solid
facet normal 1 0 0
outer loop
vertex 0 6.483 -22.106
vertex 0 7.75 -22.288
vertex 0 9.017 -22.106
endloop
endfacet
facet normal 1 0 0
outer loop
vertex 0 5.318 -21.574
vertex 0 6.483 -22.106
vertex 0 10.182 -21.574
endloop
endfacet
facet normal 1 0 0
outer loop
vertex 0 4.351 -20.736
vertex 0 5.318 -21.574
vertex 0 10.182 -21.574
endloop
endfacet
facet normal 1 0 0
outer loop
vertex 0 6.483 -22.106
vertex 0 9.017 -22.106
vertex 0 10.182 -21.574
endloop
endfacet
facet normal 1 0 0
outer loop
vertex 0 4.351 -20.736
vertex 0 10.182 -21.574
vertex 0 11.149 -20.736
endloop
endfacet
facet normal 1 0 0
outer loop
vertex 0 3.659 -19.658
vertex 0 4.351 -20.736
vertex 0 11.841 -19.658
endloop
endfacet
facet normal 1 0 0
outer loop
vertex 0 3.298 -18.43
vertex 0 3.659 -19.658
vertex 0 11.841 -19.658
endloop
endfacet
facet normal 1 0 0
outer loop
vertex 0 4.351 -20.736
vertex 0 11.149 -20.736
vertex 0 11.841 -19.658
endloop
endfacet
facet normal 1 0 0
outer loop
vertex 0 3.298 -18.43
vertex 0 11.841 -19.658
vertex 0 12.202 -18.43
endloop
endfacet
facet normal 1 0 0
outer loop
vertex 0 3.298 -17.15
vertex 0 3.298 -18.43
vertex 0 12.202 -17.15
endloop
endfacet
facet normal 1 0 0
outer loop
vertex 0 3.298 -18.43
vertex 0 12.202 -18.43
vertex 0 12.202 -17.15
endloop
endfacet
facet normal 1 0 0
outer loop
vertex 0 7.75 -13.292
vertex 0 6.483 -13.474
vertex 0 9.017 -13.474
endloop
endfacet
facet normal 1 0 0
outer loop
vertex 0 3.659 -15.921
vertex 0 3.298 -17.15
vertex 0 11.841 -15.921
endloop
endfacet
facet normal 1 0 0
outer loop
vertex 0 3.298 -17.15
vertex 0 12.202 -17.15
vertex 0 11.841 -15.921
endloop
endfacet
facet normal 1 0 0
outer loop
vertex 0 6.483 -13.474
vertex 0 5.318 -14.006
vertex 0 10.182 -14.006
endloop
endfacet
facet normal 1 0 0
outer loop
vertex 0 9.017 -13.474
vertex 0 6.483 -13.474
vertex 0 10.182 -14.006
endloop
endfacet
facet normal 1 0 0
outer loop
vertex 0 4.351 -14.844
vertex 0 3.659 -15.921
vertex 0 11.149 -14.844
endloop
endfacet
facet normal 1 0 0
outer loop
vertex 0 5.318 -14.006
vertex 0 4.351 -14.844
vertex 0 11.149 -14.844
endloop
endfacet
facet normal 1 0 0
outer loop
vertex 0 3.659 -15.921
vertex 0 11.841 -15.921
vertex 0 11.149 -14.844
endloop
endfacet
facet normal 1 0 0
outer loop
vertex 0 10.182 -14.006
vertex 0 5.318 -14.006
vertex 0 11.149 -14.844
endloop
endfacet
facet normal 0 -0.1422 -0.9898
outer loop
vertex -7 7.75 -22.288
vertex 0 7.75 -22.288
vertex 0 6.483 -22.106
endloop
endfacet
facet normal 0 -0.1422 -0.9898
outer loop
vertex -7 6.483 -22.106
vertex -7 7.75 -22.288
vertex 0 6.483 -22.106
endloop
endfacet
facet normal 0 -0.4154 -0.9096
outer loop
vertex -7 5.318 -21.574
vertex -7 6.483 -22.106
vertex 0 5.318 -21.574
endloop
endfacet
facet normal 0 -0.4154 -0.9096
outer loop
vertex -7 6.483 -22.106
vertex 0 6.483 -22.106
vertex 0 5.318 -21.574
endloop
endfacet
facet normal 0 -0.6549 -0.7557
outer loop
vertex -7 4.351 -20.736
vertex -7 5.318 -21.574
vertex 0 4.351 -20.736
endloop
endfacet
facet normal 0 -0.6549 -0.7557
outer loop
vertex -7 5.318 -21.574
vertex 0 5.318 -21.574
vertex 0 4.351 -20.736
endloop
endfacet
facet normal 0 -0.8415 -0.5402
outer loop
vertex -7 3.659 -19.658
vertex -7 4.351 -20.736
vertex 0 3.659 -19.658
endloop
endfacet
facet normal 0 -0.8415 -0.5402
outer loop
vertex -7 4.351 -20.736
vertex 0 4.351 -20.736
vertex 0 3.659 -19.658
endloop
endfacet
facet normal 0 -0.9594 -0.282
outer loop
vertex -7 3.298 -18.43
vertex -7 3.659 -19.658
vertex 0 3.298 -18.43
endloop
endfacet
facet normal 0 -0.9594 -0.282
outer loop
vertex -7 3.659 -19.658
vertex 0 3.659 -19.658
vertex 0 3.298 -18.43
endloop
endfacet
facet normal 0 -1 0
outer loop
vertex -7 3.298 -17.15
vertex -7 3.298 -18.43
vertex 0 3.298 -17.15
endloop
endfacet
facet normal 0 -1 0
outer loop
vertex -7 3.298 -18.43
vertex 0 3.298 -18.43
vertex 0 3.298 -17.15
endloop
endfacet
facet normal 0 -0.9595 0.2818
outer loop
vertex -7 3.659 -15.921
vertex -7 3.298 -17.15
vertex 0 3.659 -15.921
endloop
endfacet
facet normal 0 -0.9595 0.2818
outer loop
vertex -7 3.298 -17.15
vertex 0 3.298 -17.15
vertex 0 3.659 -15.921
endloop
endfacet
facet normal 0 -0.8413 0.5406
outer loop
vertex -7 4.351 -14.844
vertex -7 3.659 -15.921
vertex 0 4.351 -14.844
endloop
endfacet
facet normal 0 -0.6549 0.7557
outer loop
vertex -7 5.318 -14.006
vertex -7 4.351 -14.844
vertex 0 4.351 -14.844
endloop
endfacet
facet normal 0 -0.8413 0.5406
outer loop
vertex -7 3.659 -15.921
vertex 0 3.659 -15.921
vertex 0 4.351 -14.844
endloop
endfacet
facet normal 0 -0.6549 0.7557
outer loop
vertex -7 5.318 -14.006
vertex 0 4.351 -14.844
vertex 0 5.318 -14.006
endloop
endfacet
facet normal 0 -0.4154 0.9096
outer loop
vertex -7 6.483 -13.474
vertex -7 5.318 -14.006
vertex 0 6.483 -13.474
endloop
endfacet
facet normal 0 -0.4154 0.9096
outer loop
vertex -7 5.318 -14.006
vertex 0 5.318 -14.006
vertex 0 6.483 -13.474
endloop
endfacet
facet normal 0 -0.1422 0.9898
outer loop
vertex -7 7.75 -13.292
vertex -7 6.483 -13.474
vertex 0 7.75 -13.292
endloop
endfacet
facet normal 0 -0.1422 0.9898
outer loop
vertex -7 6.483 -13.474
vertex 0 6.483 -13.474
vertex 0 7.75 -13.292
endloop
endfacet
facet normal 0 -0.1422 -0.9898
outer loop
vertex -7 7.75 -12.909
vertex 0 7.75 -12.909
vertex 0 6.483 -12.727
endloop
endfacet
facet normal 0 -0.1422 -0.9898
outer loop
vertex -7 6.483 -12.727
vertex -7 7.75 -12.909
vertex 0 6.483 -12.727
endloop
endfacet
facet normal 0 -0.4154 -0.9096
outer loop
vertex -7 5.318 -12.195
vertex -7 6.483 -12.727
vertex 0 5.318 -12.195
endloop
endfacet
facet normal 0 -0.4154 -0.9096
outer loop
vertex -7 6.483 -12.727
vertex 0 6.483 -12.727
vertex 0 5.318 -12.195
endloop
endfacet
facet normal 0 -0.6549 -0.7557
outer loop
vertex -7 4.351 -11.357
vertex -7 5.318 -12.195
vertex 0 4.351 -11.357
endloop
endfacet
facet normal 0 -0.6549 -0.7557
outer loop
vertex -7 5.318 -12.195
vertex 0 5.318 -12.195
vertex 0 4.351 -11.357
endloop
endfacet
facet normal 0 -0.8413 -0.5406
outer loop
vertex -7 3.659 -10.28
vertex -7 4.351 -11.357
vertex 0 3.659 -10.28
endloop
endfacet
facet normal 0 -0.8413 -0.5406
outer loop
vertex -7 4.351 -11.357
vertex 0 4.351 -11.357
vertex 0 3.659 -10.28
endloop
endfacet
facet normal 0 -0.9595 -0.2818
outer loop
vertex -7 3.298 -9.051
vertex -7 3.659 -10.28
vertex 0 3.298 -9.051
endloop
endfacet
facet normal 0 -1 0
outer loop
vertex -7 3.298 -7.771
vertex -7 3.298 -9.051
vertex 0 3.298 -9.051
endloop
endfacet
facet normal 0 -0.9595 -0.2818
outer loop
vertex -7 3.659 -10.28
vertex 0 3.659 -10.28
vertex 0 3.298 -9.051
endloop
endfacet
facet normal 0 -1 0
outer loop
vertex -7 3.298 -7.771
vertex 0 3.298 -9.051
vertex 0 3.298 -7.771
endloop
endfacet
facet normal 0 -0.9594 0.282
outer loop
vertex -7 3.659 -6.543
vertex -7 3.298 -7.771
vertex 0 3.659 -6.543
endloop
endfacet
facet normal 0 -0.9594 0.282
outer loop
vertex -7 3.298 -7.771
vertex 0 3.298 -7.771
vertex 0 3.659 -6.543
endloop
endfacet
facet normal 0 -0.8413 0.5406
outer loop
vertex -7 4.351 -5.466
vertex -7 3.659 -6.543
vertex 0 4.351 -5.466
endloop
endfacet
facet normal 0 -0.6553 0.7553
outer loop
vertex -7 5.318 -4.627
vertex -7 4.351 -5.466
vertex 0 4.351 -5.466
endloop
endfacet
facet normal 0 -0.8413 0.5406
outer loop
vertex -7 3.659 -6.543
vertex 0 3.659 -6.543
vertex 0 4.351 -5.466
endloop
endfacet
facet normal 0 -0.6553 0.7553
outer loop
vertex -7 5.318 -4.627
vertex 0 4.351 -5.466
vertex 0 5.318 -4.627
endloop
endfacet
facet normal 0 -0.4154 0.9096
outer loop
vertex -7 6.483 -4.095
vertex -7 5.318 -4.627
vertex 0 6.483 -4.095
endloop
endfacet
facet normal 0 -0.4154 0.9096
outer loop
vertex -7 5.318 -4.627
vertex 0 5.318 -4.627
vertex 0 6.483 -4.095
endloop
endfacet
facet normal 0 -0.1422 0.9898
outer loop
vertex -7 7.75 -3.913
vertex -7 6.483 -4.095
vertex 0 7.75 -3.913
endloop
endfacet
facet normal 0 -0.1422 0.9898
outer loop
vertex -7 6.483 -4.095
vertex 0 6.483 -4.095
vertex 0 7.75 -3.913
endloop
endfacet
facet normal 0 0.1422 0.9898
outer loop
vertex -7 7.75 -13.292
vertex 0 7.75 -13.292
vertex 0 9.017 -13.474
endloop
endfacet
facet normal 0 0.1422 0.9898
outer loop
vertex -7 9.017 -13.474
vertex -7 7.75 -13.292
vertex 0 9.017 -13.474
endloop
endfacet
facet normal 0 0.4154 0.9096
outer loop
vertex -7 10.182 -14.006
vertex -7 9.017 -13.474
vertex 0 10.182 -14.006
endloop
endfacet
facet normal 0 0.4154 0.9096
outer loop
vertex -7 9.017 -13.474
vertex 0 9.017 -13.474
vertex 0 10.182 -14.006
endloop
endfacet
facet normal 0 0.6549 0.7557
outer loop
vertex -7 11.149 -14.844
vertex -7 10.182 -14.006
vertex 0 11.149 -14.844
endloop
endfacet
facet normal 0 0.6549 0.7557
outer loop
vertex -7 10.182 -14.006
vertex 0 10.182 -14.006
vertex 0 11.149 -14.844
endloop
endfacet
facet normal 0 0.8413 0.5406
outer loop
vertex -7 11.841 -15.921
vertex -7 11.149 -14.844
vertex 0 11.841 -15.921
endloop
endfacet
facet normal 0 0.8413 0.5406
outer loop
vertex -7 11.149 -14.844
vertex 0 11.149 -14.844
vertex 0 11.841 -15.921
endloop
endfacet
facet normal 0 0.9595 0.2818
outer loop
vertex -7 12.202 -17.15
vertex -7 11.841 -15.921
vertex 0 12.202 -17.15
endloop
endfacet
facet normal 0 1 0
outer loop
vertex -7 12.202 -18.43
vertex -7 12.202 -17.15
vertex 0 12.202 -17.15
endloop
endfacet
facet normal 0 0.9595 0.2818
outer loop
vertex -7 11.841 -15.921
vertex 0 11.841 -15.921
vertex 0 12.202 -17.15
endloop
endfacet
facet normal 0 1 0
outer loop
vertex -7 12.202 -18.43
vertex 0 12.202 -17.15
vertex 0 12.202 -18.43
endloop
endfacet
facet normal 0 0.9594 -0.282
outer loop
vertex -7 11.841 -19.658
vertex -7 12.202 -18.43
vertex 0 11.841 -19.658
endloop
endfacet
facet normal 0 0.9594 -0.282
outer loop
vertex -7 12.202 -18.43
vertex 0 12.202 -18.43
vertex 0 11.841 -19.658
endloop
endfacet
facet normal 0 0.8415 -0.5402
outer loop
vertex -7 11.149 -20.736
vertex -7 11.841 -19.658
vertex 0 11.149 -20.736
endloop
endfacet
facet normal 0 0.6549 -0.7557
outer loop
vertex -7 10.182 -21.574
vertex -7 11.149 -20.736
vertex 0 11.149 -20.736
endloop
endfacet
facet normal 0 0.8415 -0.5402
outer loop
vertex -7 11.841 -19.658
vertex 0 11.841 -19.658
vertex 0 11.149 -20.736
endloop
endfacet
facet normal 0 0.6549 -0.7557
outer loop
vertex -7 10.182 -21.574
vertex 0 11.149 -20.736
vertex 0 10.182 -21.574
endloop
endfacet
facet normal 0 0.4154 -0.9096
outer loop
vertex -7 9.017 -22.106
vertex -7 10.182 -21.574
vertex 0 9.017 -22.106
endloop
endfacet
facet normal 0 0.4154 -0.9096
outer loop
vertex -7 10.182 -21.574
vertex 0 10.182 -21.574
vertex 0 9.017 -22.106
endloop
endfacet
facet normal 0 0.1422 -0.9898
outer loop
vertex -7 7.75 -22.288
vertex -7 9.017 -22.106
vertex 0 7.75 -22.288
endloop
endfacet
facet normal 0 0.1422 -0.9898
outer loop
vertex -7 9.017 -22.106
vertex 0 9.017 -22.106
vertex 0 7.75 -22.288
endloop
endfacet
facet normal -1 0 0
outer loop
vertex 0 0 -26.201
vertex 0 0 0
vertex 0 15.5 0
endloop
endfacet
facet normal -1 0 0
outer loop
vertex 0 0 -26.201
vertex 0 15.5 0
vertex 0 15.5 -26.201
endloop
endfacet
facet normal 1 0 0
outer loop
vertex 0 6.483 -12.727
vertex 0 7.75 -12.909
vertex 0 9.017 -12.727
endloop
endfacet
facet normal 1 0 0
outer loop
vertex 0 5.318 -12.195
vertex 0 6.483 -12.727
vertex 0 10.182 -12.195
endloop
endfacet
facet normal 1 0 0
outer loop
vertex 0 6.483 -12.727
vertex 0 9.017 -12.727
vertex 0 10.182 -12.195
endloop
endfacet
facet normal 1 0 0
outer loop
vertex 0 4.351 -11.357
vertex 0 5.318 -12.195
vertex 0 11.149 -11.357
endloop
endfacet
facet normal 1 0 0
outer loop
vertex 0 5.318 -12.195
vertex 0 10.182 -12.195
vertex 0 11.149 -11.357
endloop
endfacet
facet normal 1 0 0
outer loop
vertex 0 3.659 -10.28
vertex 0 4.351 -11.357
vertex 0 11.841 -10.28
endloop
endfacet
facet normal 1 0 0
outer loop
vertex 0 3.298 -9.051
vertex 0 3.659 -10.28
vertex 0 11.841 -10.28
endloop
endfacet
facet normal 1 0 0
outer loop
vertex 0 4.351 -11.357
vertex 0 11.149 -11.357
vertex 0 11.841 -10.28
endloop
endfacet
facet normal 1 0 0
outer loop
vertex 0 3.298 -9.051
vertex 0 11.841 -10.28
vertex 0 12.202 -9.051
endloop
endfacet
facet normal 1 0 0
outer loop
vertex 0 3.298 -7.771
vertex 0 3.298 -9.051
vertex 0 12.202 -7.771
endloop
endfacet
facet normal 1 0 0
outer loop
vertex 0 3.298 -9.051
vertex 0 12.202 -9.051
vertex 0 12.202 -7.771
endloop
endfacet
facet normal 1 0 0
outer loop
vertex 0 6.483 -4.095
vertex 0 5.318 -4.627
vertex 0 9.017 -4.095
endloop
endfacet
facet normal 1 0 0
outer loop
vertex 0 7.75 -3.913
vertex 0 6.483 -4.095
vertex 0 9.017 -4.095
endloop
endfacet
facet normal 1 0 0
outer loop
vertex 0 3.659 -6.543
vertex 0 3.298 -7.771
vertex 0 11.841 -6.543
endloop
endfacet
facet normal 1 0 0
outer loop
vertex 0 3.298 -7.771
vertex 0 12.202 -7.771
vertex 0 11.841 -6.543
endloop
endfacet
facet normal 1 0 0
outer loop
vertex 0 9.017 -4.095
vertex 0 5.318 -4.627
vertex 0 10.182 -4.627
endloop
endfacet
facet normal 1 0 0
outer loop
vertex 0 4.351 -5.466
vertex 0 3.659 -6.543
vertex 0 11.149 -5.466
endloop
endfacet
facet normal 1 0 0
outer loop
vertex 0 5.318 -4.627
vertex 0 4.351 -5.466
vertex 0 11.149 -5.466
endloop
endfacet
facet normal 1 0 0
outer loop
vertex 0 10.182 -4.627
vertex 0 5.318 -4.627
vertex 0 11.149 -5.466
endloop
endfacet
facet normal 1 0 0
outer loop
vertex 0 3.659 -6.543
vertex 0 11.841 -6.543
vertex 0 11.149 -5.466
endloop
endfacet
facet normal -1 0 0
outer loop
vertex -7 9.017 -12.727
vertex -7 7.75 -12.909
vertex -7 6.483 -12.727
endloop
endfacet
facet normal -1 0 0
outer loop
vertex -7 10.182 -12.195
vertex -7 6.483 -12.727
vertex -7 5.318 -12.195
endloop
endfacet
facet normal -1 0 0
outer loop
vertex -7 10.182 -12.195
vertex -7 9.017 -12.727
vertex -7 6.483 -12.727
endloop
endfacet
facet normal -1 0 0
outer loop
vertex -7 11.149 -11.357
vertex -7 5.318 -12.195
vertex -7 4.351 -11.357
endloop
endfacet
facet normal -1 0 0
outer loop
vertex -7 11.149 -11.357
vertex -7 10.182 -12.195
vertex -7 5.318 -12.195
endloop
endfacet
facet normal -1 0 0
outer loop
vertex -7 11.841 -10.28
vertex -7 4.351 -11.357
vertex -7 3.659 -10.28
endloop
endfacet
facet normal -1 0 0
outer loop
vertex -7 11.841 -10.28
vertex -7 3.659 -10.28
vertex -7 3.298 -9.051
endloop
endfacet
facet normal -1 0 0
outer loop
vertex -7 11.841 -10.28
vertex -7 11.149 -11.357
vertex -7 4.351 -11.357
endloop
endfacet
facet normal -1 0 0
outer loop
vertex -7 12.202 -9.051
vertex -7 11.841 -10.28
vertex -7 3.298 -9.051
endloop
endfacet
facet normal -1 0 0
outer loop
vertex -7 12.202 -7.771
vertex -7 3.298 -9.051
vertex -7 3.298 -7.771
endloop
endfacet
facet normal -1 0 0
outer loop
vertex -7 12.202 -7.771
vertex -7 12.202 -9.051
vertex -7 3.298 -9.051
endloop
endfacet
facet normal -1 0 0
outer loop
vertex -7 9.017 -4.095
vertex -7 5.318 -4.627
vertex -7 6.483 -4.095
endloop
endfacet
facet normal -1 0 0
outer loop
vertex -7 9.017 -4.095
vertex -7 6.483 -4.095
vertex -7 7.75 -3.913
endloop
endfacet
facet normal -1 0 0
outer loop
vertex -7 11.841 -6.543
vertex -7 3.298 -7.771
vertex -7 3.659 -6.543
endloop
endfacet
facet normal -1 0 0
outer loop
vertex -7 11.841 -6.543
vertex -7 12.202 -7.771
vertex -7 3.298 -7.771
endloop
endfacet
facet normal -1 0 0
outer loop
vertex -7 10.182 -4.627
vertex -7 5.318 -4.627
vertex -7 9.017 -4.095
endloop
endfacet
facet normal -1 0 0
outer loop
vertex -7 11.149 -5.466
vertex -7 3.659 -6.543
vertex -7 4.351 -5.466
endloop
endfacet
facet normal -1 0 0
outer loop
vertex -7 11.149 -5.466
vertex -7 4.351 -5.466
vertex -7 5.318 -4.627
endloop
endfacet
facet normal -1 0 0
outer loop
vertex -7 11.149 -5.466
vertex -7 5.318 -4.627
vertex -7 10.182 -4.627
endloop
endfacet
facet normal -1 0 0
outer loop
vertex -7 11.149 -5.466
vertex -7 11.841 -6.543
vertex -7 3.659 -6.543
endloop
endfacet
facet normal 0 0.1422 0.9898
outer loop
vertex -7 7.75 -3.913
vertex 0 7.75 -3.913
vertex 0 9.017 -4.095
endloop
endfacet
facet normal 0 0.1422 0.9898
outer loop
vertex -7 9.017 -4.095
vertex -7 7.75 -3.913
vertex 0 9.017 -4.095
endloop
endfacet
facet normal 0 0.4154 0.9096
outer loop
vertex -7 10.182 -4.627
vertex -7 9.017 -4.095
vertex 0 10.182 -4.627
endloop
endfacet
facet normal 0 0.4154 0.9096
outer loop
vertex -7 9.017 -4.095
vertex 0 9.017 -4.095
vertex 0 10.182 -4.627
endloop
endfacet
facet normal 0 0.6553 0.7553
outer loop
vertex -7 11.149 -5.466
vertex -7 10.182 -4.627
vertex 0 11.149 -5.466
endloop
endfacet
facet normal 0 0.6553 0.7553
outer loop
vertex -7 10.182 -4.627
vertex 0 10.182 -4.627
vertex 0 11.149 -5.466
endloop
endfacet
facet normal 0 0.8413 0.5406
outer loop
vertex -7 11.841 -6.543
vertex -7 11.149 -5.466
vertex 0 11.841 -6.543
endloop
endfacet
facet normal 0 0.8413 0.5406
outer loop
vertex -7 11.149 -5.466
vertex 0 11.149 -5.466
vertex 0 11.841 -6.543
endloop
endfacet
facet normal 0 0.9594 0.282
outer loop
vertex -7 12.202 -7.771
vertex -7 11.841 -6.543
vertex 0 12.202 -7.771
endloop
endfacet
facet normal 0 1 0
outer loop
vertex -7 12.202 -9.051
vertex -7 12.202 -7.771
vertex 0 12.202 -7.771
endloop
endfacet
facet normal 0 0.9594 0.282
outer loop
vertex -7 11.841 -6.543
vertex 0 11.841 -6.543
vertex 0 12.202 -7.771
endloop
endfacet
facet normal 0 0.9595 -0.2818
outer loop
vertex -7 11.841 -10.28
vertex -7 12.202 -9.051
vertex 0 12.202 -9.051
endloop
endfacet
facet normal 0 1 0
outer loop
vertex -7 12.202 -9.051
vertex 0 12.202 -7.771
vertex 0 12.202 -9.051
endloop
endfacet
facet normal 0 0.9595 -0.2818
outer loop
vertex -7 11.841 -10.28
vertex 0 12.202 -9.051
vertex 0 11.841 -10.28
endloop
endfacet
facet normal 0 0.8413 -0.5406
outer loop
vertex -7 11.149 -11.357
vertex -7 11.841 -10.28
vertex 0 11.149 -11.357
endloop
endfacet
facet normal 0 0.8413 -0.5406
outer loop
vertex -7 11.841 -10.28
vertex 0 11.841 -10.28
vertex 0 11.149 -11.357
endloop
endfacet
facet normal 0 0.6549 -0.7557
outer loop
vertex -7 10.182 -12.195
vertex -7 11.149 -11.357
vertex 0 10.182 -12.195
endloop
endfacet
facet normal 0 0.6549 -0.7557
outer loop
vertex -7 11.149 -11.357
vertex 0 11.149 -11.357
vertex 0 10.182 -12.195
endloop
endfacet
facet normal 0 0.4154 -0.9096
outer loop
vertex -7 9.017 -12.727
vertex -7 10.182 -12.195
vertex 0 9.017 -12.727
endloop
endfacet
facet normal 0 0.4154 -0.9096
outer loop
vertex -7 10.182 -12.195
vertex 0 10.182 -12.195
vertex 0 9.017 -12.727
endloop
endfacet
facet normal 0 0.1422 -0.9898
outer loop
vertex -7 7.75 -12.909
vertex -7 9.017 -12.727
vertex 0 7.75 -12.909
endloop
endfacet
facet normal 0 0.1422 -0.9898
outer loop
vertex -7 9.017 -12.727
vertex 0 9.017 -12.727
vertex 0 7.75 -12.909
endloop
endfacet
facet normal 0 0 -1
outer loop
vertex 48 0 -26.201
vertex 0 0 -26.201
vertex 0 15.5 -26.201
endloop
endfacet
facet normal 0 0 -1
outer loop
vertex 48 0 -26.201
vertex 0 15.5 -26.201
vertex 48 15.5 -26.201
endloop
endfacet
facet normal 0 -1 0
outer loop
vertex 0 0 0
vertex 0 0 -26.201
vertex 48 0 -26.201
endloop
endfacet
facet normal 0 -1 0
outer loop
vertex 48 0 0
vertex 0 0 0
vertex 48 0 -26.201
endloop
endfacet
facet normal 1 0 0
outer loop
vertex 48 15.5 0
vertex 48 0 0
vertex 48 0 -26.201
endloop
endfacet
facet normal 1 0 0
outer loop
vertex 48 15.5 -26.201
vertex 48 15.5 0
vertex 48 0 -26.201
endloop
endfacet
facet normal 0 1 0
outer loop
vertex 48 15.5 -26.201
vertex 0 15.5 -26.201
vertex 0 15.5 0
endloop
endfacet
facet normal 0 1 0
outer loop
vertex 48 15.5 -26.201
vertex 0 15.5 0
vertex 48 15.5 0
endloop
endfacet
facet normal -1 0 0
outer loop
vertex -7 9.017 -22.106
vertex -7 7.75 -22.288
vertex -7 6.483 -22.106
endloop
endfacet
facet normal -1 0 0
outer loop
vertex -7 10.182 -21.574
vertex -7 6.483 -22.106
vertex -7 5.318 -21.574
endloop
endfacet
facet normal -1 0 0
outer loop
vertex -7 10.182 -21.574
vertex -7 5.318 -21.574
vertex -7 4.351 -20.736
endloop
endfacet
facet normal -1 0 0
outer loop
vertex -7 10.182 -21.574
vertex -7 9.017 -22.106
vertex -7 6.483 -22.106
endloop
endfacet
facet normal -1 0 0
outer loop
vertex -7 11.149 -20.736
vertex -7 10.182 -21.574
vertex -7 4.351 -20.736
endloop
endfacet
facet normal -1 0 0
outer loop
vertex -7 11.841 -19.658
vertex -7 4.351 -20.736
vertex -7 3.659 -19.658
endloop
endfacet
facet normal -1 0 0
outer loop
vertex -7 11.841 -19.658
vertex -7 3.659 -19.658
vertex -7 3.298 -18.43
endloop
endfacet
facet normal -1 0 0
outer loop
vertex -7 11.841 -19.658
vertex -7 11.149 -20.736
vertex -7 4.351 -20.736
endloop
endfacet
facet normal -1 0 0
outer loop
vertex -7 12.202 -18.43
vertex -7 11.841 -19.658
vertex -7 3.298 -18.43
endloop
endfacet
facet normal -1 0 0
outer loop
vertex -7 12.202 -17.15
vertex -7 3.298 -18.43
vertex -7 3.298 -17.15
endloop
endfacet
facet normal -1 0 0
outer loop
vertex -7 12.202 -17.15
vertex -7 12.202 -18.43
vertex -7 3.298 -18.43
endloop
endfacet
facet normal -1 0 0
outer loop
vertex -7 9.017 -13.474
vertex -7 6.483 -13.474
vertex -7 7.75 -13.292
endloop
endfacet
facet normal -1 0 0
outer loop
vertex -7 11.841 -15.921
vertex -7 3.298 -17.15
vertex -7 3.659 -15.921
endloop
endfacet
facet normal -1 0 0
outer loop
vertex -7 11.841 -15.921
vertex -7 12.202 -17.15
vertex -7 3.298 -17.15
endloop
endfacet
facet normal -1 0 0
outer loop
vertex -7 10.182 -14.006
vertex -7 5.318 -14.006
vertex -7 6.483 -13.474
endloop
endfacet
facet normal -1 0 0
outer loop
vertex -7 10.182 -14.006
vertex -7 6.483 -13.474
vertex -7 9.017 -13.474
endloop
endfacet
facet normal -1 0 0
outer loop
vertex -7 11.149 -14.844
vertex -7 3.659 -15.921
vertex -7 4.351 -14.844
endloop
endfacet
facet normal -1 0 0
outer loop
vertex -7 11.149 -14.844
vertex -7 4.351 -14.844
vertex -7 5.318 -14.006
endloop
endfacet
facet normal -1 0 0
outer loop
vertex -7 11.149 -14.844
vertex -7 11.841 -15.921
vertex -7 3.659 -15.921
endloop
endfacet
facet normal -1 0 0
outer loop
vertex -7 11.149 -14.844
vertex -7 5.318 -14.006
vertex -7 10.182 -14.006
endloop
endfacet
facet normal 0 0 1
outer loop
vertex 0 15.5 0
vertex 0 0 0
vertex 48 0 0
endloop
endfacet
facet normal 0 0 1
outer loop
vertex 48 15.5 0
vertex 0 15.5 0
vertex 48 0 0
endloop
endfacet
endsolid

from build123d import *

# Parameters (mm, degrees)
SKETCH1_W           = 48
SKETCH1_H           = 26.201150123
BOSS_EXTRUDE1_DEPTH = 15.5
BOSS_EXTRUDE2_DEPTH = 7


with BuildPart() as part:
    # Sketch1 → Boss-Extrude1 (new body)
    with BuildSketch(Plane(origin=(0, 0, 0), x_dir=(1, 0, 0), z_dir=(0, 1, 0))):
        with Locations((24, 13.100575062)):
            Rectangle(SKETCH1_W, SKETCH1_H)
    extrude(amount=BOSS_EXTRUDE1_DEPTH)


with BuildPart() as body_2:
    # Sketch2 → Boss-Extrude2 (new body)
    with BuildSketch(Plane.ZY):
        with BuildLine():
            ThreePointArc((-13.292024285, 7.75), (-17.789975763, 12.247951478), (-22.287927242, 7.75))
            Line((-22.287927242, 7.75), (-13.292024285, 7.75))
        make_face()
        with BuildLine():
            Line((-13.292024285, 7.75), (-22.287927242, 7.75))
            ThreePointArc((-22.287927242, 7.75), (-17.789975763, 3.252048522), (-13.292024285, 7.75))
        make_face()
        with BuildLine():
            ThreePointArc((-3.913222881, 7.75), (-8.411174359, 12.247951478), (-12.909125838, 7.75))
            Line((-12.909125838, 7.75), (-3.913222881, 7.75))
        make_face()
        with BuildLine():
            Line((-3.913222881, 7.75), (-12.909125838, 7.75))
            ThreePointArc((-12.909125838, 7.75), (-8.411174359, 3.252048522), (-3.913222881, 7.75))
        make_face()
    extrude(amount=BOSS_EXTRUDE2_DEPTH)


solid = Compound([part.part, body_2.part])
